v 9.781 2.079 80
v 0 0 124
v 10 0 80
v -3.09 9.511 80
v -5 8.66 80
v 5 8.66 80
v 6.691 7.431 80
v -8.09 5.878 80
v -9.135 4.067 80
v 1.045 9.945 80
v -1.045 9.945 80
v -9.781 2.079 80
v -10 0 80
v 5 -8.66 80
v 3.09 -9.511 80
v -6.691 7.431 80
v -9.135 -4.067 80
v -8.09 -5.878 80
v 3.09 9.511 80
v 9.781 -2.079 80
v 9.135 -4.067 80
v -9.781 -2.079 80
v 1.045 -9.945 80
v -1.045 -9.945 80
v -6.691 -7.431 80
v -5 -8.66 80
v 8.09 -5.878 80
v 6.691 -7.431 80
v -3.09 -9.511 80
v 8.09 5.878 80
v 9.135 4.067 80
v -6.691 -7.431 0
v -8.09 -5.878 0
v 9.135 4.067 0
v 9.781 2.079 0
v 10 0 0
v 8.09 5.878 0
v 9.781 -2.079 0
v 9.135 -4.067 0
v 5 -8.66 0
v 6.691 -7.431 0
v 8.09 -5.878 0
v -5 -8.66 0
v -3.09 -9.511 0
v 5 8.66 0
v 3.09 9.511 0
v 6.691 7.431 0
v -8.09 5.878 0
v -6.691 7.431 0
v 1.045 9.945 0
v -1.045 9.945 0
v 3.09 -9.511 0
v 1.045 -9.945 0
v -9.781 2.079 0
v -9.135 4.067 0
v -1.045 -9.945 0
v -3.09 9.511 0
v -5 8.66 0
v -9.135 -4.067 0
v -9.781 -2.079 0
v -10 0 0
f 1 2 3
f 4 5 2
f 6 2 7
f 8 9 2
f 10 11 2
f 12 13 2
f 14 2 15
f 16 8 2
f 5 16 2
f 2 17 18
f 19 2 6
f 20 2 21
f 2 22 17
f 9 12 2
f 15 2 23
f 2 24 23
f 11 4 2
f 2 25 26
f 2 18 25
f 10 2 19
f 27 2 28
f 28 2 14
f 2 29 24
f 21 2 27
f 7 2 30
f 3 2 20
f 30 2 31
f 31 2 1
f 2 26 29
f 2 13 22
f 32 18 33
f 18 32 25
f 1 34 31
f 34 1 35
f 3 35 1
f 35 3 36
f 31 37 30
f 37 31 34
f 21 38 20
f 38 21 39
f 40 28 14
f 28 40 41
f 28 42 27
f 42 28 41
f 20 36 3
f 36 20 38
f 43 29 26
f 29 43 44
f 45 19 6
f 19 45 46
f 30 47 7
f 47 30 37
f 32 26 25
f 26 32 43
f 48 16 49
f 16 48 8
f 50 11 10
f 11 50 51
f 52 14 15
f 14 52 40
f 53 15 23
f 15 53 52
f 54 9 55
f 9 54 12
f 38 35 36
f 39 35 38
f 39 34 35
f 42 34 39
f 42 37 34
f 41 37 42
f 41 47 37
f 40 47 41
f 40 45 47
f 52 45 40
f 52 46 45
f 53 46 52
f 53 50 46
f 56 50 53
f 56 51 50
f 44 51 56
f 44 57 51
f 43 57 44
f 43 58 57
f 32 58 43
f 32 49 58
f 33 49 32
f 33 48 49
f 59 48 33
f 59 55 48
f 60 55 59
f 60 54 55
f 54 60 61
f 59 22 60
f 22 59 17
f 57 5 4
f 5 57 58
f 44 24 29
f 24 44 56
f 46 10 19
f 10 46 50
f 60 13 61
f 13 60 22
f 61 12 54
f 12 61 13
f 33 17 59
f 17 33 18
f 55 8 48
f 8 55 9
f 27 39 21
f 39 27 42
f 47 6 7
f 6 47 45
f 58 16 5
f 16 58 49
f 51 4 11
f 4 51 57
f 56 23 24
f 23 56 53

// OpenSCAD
// [FL_INDEX: keywords="openscad, 3d_parametric, Rocket_By_Numbers, csg_solid" | COT="Parametric OpenSCAD design from 3DCodeverse"]
// Title: Rocket By Numbers

//Rocket Tube Height
rheight = 80;

//Rocket Tube Width
rwidth = 10;

//Number of Fins
nfins = 5; // [0,1,2,3,4,5,6,7,8,9,10]

//Body
translate([0,0,rheight])
cylinder(0.55*rheight,rwidth,0);

//Cone
cylinder(rheight,rwidth,rwidth);

//N Fin
for (i = [0:nfins-1])
{
	//Rotate the fin around the centre
	rotate([90,0,(360/nfins)*i])translate([rwidth,0,0])//Push it our radius
	{ 
		//Design each fin
		polygon(points=[[0,0],[0,rheight*0.4],[rheight*0.2,0]],paths=[[0,1,2]]);
	}

}
